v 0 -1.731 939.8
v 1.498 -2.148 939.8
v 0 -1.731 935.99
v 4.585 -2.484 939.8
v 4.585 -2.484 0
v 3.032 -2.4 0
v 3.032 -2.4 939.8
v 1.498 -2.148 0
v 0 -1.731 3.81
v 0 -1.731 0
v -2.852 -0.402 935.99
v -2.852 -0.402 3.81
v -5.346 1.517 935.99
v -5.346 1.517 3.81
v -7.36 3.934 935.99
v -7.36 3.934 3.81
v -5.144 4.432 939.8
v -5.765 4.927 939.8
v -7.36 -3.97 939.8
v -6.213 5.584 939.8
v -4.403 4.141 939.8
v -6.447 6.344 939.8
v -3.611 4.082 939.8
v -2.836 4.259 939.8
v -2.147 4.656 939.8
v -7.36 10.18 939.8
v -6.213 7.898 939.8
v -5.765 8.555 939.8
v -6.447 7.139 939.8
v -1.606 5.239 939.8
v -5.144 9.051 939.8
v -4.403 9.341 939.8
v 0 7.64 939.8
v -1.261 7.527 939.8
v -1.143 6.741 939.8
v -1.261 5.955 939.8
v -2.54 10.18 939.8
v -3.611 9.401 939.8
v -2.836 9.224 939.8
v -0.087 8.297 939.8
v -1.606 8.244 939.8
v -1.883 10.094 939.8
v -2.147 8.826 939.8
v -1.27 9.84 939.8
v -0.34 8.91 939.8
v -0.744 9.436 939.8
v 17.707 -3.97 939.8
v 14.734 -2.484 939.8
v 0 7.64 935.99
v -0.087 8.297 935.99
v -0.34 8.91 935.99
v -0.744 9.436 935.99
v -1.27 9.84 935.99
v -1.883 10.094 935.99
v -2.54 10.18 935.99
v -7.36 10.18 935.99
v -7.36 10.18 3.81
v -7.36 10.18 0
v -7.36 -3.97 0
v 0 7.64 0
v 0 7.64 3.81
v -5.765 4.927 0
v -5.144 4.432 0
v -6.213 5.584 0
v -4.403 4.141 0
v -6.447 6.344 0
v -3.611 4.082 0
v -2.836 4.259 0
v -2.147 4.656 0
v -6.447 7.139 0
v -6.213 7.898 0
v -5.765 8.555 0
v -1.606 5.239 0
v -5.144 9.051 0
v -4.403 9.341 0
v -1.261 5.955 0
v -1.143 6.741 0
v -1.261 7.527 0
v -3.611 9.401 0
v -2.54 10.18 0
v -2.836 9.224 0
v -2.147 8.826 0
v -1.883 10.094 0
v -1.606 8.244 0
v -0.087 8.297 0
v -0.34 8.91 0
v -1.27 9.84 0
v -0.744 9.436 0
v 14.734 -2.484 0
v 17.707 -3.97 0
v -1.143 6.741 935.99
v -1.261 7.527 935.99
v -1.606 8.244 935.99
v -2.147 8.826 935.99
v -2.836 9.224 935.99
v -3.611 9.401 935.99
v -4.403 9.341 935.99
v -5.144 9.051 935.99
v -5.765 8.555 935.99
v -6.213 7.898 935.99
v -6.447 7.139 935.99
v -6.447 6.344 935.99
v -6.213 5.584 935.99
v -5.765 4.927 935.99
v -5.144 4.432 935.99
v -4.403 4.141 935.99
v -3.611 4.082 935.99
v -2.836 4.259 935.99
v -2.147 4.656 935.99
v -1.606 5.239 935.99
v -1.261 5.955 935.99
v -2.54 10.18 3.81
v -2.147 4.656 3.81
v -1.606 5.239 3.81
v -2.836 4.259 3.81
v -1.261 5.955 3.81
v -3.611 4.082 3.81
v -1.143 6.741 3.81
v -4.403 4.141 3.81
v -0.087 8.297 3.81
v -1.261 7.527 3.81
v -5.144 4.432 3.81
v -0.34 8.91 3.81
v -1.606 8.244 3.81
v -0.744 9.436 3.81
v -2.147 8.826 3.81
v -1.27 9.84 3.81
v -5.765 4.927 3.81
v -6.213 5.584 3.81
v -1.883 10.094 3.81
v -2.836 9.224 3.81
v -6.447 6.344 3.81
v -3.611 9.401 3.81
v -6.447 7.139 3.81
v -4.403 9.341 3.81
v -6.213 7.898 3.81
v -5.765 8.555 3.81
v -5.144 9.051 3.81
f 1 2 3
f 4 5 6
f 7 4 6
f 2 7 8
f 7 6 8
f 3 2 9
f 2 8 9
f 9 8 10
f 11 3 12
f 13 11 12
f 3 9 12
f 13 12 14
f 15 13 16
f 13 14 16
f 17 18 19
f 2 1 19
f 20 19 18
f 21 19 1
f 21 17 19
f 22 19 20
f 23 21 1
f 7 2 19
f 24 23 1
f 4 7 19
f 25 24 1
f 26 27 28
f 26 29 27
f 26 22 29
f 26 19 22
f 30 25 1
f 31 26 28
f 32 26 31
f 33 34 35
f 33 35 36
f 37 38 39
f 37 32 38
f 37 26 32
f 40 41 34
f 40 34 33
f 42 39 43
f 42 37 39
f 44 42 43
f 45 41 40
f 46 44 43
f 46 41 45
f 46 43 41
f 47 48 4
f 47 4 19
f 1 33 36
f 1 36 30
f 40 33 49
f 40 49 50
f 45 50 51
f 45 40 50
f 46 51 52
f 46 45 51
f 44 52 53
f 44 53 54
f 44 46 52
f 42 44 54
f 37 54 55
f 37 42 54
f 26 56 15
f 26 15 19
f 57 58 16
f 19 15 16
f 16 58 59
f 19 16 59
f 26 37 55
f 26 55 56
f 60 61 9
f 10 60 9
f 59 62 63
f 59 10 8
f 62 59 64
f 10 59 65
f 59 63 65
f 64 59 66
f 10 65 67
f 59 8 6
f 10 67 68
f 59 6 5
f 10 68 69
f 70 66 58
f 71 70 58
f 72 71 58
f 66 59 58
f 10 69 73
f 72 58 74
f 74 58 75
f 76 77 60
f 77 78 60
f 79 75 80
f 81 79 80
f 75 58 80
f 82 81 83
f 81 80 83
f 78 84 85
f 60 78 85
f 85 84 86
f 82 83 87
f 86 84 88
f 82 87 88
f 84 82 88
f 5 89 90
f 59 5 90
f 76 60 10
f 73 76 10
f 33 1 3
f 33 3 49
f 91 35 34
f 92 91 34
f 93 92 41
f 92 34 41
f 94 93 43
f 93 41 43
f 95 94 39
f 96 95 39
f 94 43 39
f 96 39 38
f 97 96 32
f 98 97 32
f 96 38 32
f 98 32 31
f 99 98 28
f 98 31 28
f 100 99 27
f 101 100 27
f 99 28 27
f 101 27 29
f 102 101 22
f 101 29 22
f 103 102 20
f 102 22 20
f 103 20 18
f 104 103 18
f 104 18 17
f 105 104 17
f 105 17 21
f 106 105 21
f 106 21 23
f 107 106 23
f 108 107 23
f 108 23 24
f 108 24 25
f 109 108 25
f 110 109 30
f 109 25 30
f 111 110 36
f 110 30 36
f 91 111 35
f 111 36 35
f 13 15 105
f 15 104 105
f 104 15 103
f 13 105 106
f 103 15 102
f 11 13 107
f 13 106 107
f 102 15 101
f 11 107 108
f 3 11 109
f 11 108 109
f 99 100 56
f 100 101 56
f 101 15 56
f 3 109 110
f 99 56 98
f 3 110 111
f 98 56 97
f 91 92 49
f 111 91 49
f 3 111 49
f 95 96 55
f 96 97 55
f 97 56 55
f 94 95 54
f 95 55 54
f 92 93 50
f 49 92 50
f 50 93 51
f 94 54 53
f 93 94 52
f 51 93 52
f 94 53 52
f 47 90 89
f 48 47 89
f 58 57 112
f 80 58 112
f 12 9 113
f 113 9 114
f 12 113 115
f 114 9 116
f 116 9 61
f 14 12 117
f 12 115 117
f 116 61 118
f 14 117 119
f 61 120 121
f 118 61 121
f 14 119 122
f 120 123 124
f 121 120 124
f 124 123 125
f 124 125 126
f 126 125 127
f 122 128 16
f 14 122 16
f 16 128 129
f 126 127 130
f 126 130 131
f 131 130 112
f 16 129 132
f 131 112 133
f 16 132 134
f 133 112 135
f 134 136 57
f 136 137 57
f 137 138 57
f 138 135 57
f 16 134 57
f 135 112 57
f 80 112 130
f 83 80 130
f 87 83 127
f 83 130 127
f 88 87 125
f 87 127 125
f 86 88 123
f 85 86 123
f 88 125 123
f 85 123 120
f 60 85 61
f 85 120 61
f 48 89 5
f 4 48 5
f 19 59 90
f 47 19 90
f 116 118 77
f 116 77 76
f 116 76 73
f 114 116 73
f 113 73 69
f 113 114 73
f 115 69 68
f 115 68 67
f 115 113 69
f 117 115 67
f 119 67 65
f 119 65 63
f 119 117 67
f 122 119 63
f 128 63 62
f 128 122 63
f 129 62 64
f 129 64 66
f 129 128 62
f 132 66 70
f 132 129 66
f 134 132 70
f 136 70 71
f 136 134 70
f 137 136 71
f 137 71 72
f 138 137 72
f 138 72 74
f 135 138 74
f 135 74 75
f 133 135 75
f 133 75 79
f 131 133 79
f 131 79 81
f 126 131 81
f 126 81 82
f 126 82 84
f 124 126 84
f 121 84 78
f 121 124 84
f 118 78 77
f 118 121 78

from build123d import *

# Parameters (mm, degrees)
BOSS_EXTRUDE1_DEPTH = 939.8
SKETCH2_R           = 2.667
BOSS_EXTRUDE2_DEPTH = 3.81
BOSS_EXTRUDE3_START = -3.81
SKETCH3_R           = 2.667
BOSS_EXTRUDE3_DEPTH = 3.81


with BuildPart() as part:
    # Sketch1 → Boss-Extrude1 (new body)
    with BuildSketch(Plane.XY):
        with BuildLine():
            Line((-7.360249805, 3.93392662), (-7.360249805, -3.970205312))
            Line((-7.360249805, -3.970205312), (7.360249805, -3.970205312))
            Line((7.360249805, -3.970205312), (17.707328311, -3.970205312))
            Line((17.707328311, -3.970205312), (14.73419743, -2.484193787))
            Line((14.73419743, -2.484193787), (4.584628721, -2.484193787))
            ThreePointArc((4.584628721, -2.484193787), (-2.195349018, -0.778057865), (-7.360249805, 3.93392662))
        make_face()
    extrude(amount=BOSS_EXTRUDE1_DEPTH)

    # Sketch2 → Boss-Extrude2 (add)
    with BuildSketch(Plane.XY.offset(939.8)):
        with BuildLine():
            Line((-7.360249805, -3.970205312), (0, -3.970205312))
            Line((0, -3.970205312), (0, 7.640068299))
            ThreePointArc((0, 7.640068299), (-0.743948776, 9.436119523), (-2.54, 10.180068299))
            Line((-2.54, 10.180068299), (-7.360249805, 10.180068299))
            Line((-7.360249805, 10.180068299), (-7.360249805, -3.970205312))
        make_face()
        with Locations((-3.81, 6.741214638)):
            Circle(SKETCH2_R, mode=Mode.SUBTRACT)
    extrude(amount=-BOSS_EXTRUDE2_DEPTH)

    # Sketch3 → Boss-Extrude3 (add)
    with BuildSketch(Plane(origin=(0, 0, 0), x_dir=(-1, 0, 0), z_dir=(0, 0, -1)).offset(BOSS_EXTRUDE3_START)):
        with BuildLine():
            Line((0, -1.730708485), (0, -3.970205312))
            Line((0, -3.970205312), (7.360249805, -3.970205312))
            Line((7.360249805, -3.970205312), (7.360249805, 3.93392662))
            Line((7.360249805, 3.93392662), (7.360249805, 10.180068299))
            Line((7.360249805, 10.180068299), (2.54, 10.180068299))
            ThreePointArc((2.54, 10.180068299), (0.743948776, 9.436119523), (0, 7.640068299))
            Line((0, 7.640068299), (0, -1.730708485))
        make_face()
        with Locations(Location((3.81, 6.741214638, 0), (0, 0, 180))):
            Circle(SKETCH3_R, mode=Mode.SUBTRACT)
    extrude(amount=BOSS_EXTRUDE3_DEPTH)


solid = part.part
